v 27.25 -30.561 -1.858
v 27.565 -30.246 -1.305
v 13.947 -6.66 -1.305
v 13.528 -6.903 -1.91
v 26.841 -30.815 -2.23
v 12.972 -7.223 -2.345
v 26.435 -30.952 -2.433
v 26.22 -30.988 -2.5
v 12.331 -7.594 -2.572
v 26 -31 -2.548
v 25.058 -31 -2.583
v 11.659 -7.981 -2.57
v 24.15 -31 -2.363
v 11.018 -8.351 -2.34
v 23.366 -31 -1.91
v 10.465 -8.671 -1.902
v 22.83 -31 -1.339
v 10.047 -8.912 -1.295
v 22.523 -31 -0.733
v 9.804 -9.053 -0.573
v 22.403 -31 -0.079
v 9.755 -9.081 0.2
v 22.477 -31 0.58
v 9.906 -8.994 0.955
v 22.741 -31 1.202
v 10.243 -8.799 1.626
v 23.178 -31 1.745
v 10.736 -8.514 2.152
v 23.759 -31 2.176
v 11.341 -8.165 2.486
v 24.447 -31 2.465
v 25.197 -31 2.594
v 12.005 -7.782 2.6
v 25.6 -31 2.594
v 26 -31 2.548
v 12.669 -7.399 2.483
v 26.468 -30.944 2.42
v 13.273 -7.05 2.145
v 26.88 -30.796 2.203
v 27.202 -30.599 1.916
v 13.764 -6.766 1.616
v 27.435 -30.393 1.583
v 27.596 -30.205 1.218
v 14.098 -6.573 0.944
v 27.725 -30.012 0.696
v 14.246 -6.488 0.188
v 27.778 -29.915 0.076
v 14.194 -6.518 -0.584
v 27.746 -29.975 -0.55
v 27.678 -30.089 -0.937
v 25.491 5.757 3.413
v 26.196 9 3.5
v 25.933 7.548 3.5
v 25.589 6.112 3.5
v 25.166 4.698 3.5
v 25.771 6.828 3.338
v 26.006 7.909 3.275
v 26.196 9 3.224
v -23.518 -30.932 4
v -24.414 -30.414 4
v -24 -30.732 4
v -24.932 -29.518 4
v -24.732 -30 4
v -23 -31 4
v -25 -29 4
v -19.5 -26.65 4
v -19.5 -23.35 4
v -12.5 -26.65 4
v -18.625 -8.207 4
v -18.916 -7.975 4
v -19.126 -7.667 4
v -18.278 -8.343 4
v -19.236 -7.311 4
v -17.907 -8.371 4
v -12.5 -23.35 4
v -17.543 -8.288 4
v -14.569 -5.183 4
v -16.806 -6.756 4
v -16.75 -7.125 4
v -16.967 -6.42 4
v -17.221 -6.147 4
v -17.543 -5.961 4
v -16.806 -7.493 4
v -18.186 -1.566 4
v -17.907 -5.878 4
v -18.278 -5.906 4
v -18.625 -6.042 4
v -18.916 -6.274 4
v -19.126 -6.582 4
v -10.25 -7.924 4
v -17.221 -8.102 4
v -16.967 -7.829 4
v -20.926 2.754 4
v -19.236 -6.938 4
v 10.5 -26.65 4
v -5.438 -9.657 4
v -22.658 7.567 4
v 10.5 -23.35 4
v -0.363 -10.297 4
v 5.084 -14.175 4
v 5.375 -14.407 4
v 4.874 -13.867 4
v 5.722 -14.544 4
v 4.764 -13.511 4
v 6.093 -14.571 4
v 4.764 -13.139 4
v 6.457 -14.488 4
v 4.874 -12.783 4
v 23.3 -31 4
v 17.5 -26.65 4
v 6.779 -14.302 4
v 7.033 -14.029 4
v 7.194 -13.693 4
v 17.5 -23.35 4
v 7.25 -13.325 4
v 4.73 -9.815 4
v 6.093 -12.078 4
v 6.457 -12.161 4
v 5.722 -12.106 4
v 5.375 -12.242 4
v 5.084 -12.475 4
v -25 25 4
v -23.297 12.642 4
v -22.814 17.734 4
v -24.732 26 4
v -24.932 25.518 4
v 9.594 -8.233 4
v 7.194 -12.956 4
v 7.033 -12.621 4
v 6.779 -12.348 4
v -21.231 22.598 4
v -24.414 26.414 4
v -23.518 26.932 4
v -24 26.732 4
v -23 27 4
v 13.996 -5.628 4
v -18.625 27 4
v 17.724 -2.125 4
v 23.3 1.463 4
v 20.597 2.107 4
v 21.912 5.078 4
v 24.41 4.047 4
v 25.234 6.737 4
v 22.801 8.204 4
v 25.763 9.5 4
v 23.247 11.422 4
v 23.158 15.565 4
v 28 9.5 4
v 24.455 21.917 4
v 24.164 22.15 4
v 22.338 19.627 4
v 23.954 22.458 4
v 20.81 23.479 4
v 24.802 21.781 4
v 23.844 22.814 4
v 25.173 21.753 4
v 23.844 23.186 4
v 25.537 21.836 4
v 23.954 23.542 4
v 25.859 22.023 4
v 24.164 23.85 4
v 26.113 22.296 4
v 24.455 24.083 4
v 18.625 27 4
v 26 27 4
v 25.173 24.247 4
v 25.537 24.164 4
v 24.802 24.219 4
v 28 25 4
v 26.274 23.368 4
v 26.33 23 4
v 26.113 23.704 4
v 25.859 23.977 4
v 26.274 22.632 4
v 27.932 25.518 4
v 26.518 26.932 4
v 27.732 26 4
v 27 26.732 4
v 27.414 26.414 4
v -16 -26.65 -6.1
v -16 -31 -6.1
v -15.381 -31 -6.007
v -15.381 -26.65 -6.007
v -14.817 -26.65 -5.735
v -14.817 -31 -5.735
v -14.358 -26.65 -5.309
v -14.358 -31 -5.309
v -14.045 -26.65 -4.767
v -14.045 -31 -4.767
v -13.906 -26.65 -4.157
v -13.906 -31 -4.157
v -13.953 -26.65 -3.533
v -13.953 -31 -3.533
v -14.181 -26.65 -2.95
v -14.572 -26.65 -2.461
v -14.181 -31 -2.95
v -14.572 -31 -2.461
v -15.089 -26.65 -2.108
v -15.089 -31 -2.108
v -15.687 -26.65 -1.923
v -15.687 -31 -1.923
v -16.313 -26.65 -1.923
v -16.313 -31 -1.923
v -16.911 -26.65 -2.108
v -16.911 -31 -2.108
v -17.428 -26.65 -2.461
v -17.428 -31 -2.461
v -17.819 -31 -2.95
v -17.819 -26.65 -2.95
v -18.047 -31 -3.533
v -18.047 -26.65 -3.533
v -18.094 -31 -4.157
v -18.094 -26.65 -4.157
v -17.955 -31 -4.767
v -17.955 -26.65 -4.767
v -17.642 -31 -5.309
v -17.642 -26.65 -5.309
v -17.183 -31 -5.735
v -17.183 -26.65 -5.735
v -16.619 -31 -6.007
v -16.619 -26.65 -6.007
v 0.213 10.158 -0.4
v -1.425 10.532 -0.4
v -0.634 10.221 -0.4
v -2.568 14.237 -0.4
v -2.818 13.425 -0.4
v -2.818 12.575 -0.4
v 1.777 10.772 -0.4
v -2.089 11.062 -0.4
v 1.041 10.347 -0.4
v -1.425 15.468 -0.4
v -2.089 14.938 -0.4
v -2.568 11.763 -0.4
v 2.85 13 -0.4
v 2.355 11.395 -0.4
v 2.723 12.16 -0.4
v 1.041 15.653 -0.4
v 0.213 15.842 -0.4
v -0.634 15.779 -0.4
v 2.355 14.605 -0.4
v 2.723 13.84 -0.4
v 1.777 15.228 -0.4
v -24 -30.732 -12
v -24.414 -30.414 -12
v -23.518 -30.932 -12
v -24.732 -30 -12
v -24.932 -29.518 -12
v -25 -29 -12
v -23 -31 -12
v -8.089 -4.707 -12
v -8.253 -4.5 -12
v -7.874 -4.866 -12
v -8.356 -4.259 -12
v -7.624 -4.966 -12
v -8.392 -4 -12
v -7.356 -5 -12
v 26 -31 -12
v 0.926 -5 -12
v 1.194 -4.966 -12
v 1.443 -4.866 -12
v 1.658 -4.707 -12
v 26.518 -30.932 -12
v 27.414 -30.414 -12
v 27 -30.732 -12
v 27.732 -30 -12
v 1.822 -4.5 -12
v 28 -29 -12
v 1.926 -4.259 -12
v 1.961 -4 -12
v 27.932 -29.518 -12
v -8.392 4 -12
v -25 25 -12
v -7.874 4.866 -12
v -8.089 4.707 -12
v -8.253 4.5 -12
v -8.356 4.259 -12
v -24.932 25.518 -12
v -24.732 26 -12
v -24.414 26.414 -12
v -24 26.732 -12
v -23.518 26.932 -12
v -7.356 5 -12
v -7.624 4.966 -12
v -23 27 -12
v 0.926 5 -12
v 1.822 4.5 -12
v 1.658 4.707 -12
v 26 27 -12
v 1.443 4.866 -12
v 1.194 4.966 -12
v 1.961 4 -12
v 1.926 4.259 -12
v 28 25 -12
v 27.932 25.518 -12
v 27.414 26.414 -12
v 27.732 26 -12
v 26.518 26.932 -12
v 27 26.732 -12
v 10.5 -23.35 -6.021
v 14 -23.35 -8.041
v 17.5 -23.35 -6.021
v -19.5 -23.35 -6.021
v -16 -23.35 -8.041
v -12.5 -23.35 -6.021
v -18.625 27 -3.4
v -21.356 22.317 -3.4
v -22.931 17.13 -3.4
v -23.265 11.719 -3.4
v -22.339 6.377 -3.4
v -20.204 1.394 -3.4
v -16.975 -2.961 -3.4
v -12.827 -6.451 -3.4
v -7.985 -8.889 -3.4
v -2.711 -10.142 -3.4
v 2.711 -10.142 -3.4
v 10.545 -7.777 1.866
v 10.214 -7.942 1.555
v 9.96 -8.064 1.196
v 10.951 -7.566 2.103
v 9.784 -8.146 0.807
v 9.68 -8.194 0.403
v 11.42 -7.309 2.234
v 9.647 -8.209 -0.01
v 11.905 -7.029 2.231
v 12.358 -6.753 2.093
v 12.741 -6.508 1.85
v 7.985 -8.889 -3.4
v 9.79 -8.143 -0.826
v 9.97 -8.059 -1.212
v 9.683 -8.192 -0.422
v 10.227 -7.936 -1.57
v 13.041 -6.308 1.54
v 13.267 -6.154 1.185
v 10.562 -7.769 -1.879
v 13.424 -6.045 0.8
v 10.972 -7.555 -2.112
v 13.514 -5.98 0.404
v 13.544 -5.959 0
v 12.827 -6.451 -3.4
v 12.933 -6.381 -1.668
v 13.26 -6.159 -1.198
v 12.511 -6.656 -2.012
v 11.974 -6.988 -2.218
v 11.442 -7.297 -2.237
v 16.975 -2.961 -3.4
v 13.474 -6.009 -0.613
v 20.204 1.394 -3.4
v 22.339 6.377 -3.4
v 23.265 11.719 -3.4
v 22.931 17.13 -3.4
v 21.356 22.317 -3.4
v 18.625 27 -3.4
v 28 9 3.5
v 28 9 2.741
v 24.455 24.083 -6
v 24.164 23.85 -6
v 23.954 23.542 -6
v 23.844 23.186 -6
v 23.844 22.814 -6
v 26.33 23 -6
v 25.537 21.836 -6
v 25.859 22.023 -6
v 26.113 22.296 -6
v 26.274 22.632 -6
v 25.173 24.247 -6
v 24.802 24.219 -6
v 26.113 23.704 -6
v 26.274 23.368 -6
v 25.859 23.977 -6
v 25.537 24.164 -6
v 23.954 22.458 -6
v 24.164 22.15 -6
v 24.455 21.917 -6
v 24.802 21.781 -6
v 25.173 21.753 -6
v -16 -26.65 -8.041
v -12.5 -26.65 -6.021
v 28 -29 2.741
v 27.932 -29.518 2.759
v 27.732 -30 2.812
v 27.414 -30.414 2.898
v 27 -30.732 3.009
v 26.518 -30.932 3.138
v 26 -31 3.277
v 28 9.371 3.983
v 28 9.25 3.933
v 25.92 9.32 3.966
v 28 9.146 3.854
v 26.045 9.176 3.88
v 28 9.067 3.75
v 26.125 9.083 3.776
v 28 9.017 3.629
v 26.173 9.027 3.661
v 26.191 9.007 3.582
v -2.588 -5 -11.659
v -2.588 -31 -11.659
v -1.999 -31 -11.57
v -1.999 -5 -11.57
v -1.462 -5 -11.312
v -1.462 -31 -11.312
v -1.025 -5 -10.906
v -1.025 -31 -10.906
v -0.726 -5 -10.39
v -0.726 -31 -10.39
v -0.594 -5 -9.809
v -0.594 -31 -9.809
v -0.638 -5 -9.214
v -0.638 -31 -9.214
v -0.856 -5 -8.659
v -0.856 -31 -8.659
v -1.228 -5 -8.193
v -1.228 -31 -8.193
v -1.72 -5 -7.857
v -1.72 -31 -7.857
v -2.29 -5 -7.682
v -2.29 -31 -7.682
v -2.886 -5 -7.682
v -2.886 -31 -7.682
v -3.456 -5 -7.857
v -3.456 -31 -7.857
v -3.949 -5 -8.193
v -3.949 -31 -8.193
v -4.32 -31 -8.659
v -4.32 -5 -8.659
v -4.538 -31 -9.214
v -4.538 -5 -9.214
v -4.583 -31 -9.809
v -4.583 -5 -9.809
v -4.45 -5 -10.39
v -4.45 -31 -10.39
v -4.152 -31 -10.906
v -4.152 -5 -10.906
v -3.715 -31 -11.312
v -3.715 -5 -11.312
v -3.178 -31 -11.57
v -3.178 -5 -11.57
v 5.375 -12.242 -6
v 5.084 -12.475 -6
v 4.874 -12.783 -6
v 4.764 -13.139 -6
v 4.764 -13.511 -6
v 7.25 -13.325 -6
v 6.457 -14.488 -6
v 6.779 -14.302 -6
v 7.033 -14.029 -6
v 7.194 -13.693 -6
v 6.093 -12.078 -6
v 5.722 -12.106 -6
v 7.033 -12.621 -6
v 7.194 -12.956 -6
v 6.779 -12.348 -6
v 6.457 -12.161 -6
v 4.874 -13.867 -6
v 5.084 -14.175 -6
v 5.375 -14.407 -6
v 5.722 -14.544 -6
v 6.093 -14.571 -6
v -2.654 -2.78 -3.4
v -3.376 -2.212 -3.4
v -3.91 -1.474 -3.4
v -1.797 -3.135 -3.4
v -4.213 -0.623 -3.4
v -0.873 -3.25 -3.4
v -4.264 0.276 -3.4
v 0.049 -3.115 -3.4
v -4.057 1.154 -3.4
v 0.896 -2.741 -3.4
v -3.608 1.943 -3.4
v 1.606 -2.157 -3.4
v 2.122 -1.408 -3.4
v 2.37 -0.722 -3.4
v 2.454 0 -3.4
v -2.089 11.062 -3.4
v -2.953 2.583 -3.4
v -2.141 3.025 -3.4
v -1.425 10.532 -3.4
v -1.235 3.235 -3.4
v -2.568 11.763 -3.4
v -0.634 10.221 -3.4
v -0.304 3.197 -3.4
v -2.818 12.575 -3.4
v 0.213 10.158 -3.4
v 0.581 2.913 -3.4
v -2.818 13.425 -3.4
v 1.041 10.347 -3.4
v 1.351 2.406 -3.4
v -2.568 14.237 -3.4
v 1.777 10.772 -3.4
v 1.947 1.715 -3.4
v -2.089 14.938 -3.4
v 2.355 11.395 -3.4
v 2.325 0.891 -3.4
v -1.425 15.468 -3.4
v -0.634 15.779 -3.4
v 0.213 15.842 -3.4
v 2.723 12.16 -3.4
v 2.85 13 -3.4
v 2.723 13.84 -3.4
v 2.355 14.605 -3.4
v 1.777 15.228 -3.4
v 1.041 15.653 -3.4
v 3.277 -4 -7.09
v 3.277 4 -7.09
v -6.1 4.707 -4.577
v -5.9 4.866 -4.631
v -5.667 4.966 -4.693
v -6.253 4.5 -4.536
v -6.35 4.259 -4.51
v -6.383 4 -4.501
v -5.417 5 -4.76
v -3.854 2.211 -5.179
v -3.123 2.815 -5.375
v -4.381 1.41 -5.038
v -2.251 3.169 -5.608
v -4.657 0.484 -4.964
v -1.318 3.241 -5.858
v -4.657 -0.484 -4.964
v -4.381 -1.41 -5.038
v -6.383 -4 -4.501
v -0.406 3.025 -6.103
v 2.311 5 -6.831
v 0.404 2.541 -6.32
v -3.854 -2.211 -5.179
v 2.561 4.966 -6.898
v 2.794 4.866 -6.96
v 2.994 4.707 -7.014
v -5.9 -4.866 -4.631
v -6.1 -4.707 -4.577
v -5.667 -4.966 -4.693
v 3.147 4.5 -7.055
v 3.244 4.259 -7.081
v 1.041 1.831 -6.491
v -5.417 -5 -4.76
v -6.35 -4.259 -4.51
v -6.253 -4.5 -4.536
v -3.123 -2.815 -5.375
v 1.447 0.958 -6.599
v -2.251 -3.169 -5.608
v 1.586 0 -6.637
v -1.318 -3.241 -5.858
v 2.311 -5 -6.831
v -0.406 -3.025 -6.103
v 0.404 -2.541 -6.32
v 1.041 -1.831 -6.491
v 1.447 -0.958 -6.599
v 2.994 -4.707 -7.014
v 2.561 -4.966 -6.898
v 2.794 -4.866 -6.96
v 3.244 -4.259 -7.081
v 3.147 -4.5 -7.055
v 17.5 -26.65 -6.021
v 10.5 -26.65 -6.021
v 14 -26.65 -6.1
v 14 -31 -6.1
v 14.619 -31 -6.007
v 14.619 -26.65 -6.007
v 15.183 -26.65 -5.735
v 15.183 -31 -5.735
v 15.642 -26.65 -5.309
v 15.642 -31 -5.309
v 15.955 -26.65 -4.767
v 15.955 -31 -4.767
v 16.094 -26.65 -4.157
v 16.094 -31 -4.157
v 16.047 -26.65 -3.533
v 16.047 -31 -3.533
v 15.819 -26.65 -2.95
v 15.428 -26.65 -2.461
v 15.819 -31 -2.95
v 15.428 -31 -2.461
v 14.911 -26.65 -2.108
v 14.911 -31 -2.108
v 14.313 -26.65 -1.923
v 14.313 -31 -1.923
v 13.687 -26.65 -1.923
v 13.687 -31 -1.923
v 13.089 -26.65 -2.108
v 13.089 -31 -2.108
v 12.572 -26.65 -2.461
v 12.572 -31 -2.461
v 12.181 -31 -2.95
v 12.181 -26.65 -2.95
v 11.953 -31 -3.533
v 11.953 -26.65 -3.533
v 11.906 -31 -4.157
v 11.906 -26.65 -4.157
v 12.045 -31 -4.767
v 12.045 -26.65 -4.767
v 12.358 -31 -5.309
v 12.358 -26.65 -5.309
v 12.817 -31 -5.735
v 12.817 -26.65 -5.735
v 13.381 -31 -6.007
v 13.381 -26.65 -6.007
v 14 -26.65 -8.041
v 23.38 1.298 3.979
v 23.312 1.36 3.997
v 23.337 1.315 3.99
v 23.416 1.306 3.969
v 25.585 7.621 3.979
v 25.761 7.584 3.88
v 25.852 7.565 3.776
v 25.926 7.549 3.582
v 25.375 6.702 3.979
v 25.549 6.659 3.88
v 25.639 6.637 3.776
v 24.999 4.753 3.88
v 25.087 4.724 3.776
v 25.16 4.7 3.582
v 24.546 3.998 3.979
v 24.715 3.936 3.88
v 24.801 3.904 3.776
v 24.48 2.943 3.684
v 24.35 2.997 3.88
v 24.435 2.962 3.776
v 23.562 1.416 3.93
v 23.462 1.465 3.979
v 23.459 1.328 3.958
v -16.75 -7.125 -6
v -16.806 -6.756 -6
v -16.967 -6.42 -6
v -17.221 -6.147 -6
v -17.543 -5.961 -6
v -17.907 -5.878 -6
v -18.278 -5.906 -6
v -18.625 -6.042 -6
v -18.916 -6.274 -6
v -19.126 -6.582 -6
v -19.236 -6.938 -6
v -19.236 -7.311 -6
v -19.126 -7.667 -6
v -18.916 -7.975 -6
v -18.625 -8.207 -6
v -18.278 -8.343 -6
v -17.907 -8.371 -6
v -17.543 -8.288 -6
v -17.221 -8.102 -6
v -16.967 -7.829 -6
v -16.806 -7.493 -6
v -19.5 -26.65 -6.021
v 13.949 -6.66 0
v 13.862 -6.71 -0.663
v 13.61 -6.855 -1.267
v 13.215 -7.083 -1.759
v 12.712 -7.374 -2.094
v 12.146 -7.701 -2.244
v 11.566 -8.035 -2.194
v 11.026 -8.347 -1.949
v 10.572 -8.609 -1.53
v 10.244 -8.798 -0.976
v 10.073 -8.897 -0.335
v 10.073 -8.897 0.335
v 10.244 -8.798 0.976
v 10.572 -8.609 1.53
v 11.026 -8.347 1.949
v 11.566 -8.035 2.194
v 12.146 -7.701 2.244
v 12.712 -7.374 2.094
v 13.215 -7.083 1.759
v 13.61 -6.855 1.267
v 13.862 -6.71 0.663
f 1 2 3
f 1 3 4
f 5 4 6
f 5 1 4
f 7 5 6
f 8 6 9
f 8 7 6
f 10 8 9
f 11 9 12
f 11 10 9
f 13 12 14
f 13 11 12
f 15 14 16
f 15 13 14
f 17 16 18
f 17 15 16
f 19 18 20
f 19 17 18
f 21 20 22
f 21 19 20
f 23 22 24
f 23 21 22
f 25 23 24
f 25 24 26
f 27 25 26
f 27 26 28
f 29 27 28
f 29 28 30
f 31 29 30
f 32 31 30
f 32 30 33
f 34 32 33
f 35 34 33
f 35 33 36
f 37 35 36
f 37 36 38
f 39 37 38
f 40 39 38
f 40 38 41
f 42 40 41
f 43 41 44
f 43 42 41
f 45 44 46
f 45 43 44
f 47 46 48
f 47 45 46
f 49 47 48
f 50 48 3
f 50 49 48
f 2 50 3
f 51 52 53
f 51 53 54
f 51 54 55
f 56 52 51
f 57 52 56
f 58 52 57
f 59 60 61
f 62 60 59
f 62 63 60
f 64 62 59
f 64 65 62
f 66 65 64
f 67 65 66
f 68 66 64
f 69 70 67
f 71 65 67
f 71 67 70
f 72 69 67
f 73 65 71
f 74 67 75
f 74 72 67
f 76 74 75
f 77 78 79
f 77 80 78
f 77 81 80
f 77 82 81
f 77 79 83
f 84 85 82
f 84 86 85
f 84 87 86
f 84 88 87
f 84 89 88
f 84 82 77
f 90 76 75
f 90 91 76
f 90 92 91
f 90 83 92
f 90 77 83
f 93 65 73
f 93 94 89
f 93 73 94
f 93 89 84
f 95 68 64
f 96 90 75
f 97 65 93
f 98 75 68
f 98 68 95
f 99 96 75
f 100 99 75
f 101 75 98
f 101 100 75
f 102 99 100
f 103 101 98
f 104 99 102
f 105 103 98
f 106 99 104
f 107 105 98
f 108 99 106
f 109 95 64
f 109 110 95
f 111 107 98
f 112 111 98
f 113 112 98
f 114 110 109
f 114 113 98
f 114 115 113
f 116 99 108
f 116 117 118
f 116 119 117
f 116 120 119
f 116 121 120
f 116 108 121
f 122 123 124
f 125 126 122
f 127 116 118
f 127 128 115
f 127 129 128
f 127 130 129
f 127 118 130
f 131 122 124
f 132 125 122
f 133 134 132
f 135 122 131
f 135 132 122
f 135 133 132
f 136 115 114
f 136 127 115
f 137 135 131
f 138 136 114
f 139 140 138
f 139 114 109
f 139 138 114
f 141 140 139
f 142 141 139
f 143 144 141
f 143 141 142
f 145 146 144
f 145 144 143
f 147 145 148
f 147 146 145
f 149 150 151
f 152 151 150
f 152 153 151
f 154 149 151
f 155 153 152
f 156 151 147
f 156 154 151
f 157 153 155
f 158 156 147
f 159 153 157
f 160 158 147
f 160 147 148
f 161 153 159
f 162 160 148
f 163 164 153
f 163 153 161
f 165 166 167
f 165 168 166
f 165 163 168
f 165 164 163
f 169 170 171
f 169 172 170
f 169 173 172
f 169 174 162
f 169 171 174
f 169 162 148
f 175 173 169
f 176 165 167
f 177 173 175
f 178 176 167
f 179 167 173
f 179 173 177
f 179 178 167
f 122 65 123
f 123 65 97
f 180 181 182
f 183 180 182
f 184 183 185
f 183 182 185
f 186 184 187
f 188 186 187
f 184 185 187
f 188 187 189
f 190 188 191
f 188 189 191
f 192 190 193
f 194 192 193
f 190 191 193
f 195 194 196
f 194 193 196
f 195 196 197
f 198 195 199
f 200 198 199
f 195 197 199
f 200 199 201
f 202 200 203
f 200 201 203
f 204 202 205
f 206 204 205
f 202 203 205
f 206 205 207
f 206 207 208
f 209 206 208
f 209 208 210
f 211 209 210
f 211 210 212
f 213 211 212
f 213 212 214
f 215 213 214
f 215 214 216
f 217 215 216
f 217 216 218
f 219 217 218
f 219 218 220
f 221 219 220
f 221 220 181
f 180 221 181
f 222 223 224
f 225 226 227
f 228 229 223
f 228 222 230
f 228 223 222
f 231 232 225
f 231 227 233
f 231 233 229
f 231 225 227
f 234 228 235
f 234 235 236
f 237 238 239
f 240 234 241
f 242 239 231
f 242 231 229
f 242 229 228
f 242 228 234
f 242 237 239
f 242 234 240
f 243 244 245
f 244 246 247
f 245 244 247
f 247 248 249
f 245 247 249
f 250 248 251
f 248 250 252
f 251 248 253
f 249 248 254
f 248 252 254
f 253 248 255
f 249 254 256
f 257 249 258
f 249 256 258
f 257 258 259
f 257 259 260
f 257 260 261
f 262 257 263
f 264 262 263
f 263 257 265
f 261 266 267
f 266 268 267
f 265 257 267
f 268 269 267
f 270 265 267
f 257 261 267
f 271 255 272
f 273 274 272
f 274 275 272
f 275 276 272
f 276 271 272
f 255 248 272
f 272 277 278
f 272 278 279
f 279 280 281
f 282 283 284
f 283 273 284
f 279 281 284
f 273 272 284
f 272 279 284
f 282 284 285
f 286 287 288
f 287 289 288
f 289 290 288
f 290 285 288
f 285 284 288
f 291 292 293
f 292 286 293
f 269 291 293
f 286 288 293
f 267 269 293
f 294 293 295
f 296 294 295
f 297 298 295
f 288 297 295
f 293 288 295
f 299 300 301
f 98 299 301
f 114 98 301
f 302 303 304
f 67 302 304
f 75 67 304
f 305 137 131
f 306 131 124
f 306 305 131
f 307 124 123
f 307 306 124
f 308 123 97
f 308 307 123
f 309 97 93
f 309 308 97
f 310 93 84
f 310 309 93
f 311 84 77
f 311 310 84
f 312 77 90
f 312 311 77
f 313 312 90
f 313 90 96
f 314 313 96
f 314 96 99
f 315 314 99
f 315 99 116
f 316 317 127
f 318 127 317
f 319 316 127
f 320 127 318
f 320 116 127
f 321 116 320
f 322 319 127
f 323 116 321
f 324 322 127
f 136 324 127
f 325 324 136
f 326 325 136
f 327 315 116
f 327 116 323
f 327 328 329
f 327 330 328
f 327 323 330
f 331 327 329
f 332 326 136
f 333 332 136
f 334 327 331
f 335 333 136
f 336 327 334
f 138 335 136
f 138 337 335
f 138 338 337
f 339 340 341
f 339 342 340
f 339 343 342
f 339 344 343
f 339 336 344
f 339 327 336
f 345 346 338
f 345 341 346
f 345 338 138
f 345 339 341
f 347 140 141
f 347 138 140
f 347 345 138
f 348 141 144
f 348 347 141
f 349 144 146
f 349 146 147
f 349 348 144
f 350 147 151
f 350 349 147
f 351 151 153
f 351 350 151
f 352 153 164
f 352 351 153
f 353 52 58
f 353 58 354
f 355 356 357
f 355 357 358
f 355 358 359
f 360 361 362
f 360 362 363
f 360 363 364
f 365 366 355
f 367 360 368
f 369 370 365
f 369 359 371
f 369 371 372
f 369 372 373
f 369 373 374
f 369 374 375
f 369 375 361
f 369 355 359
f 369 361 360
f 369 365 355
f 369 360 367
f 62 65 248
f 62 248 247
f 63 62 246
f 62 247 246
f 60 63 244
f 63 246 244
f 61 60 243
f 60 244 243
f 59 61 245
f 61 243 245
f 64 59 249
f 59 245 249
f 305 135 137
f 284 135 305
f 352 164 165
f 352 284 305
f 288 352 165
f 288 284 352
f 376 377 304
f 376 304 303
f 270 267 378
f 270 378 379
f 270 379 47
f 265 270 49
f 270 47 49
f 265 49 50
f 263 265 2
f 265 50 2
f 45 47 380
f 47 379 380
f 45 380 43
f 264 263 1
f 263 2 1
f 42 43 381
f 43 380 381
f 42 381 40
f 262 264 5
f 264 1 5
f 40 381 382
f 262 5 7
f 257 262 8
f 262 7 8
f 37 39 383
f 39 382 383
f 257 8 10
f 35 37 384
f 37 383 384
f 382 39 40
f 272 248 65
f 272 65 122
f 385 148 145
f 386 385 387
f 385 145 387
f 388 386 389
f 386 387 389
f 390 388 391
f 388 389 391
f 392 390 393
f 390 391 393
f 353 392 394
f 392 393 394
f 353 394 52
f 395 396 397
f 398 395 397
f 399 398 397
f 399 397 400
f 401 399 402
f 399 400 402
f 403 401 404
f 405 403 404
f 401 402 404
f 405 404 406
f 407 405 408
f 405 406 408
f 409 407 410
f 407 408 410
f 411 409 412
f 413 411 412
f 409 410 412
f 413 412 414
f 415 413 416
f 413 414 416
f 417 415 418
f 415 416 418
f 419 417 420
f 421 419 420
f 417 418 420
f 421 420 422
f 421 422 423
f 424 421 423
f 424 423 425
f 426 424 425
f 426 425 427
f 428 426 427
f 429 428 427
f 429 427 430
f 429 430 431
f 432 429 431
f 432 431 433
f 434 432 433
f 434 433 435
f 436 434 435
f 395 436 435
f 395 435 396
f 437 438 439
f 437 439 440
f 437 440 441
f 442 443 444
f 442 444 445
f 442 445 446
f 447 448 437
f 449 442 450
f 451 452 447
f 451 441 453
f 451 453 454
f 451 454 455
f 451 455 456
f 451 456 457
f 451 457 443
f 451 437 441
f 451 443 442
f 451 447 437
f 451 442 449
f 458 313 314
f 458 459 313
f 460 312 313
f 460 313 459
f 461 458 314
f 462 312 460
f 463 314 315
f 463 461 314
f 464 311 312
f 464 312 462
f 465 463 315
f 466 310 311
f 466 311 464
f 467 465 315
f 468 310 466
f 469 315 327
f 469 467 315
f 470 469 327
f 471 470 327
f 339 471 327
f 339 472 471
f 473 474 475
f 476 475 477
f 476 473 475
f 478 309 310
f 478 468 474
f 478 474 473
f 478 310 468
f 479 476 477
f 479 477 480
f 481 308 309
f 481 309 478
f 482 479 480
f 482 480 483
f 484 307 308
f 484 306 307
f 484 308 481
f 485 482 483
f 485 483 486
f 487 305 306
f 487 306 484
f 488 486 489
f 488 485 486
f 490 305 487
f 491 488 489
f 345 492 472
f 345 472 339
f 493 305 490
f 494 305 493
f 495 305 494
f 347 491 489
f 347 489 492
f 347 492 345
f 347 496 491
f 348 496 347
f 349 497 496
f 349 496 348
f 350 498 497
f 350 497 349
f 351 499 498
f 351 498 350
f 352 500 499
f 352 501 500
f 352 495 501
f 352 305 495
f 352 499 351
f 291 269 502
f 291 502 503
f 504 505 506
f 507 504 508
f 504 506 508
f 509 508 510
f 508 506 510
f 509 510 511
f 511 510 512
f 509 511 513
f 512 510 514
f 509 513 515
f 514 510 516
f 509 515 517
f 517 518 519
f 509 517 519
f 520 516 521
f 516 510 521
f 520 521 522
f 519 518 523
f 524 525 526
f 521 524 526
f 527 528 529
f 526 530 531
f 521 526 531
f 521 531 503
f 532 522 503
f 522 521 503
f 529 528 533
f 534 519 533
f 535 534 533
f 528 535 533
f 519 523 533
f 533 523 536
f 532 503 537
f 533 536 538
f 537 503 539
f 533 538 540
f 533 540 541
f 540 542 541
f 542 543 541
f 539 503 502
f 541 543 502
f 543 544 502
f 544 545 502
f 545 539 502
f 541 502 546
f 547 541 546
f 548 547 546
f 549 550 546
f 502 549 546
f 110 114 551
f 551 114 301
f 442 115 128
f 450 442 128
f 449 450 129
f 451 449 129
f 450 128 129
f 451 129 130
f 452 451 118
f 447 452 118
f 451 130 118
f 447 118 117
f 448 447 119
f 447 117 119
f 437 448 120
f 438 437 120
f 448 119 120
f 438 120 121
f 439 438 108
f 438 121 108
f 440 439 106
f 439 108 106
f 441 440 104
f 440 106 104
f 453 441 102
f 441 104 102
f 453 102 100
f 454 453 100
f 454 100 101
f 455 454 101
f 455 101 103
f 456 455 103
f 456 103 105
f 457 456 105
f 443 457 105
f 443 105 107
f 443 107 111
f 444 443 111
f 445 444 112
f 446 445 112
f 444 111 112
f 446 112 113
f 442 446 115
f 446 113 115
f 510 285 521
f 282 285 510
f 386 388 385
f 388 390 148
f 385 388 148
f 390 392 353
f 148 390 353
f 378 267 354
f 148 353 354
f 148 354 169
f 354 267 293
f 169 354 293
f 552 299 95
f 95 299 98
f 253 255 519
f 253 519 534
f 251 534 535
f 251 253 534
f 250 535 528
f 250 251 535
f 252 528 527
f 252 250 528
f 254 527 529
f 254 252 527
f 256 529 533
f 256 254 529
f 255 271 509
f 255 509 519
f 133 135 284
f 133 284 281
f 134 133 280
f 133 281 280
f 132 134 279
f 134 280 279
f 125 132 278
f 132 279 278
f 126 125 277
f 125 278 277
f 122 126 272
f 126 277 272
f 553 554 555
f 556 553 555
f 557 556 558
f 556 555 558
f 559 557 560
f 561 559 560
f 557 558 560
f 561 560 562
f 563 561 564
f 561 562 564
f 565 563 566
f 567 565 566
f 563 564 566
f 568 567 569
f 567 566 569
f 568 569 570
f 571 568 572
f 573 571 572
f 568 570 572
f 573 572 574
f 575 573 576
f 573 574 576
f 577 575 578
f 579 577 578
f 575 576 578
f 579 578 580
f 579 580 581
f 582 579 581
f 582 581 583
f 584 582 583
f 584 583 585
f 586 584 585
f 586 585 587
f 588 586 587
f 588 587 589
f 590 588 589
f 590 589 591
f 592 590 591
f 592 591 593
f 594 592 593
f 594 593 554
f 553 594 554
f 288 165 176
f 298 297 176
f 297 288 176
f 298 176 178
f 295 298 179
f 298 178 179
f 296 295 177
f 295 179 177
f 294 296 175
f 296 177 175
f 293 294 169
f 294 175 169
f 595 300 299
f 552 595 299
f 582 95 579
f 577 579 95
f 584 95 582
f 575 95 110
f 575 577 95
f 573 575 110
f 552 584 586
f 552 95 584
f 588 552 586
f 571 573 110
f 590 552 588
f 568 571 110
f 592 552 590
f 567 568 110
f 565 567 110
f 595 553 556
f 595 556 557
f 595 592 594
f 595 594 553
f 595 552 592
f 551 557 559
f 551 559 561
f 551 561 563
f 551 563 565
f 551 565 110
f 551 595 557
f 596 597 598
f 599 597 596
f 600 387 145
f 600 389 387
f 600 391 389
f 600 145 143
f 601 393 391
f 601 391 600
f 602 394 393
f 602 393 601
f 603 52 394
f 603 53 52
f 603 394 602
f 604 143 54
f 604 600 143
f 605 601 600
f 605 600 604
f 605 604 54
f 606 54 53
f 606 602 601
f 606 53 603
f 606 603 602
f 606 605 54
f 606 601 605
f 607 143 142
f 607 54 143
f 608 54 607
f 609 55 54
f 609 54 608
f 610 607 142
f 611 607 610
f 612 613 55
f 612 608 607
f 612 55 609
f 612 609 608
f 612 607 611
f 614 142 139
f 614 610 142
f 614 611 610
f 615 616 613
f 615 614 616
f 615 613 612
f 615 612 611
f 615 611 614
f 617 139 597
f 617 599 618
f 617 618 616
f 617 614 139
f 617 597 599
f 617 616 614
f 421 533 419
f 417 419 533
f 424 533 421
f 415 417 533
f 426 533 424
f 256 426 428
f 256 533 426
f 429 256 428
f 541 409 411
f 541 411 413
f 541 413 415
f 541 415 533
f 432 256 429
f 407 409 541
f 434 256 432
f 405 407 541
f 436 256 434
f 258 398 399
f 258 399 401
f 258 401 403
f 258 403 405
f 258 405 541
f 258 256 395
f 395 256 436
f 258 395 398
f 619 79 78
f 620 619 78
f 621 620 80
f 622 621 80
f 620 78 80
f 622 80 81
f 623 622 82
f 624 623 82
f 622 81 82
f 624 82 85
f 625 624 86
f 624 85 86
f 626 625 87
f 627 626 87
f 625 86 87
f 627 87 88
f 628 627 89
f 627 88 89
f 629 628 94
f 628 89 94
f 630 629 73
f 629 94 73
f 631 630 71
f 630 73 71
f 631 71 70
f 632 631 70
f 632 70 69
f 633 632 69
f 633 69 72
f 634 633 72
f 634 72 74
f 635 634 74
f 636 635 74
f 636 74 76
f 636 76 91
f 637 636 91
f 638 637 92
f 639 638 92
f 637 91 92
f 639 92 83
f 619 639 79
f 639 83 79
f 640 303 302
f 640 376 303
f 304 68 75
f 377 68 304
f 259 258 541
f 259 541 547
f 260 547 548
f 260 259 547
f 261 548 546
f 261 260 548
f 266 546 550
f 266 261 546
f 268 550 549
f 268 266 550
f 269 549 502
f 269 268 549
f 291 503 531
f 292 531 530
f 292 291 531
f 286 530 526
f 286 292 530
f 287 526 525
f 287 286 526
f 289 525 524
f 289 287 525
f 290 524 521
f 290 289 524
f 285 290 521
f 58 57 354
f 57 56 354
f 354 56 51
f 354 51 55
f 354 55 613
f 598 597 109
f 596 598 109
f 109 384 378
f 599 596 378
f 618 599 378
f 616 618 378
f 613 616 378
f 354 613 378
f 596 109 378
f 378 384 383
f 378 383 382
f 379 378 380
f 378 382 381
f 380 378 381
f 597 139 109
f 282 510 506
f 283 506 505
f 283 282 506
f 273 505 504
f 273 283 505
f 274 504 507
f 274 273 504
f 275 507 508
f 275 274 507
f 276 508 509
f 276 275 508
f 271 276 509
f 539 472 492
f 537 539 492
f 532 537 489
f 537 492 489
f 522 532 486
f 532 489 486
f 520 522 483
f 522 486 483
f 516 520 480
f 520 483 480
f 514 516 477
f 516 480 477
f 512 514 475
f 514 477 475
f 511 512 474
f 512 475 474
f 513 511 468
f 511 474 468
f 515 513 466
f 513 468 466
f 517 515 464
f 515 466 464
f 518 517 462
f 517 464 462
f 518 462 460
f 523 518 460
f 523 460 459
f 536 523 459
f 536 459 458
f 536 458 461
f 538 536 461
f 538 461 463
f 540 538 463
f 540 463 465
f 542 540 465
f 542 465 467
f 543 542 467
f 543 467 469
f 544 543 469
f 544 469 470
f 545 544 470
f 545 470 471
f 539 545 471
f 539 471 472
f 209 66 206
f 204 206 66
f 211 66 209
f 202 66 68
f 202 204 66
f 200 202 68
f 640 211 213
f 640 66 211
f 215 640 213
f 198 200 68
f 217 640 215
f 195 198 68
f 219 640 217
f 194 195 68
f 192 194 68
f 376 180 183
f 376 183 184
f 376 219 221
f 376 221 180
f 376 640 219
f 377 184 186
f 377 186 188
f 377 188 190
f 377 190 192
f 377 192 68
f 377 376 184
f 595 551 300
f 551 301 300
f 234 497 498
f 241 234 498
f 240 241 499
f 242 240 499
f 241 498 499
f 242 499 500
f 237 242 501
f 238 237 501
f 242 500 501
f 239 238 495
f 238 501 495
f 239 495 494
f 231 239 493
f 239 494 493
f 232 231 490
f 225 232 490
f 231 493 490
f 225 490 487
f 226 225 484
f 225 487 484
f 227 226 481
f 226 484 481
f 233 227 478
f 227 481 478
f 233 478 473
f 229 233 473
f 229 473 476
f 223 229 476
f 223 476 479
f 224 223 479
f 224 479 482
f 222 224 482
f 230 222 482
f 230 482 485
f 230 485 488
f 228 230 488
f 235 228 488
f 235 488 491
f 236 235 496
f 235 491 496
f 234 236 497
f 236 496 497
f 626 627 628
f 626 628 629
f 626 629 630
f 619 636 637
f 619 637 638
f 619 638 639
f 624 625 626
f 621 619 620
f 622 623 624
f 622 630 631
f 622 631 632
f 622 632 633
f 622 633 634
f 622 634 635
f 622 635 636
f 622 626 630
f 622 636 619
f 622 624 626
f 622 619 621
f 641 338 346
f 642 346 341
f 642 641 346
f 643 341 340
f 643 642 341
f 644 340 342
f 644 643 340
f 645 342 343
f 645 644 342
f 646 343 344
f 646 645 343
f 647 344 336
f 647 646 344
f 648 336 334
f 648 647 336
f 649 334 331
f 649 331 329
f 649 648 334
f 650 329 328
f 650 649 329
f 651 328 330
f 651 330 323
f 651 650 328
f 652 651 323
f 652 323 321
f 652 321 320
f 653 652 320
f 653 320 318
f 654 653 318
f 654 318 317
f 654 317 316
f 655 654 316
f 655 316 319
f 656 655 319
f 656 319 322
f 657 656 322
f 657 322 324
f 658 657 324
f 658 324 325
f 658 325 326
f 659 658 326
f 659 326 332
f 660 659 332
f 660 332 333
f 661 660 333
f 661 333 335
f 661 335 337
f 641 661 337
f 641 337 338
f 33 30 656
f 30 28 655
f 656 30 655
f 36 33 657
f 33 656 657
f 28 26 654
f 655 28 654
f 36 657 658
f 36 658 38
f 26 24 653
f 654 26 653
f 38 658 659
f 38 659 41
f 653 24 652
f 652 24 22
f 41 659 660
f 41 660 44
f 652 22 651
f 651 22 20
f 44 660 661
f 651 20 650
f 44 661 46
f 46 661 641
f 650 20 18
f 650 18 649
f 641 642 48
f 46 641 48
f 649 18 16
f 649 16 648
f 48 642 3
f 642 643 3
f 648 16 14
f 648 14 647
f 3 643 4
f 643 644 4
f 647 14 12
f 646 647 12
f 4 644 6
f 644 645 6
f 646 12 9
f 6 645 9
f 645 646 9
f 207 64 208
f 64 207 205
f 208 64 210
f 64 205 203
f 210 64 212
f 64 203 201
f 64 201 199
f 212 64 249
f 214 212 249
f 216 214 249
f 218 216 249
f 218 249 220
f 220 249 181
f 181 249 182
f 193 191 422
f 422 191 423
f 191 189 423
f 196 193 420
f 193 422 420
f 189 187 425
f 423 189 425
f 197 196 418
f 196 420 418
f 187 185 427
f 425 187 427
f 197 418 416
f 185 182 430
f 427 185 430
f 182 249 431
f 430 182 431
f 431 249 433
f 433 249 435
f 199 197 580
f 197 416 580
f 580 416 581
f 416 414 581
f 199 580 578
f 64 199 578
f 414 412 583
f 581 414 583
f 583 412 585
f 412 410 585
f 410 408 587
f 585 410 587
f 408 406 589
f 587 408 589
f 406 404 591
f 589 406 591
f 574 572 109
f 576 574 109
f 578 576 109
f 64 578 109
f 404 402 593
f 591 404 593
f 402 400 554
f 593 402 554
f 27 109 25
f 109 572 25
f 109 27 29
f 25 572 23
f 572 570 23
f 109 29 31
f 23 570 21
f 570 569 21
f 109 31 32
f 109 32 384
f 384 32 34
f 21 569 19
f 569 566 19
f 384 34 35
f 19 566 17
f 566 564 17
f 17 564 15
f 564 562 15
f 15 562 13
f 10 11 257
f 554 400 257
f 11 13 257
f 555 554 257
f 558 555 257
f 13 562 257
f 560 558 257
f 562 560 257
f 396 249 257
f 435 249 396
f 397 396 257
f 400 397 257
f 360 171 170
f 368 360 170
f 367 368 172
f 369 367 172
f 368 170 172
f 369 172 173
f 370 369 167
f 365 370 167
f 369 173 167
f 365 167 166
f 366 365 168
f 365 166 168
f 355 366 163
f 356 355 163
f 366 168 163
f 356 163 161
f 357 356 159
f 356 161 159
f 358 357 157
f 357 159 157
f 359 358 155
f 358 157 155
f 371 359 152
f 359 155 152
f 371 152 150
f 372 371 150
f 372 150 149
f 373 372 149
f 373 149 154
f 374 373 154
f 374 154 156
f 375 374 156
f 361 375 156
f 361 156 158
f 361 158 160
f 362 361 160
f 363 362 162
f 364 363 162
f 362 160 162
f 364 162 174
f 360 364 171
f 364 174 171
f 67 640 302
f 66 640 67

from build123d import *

# Parameters (mm, degrees)
BOSS_EXTRUDE1_DEPTH      = 4
BOSS_EXTRUDE1_DEPTH_BACK = 12
SKETCH1_W                = 53
SKETCH1_H                = 58
CUT_EXTRUDE1_DEPTH       = 4
CUT_EXTRUDE1_DEPTH_BACK  = 3.4
SKETCH2_R                = 23.3
SKETCH3_R                = 2.85
BOSS_EXTRUDE2_DEPTH      = 3
SKETCH4_R                = 2.25
CUT_EXTRUDE2_DEPTH       = 32
SKETCH5_R                = 2.6
CUT_EXTRUDE3_DEPTH       = 30
SKETCH6_R                = 3.25
CUT_EXTRUDE4_DEPTH       = 44.462627624
CUT_EXTRUDE5_DEPTH       = 8
SKETCH11_R               = 1.5
CUT_EXTRUDE6_DEPTH       = 27
SKETCH12_R               = 2
CUT_EXTRUDE7_DEPTH       = 27
SKETCH13_R               = 1.25
CUT_EXTRUDE8_DEPTH       = 10
FILLET1_R                = 2
CUT_EXTRUDE9_DEPTH       = 40
BOSS_EXTRUDE3_START      = -3
BOSS_EXTRUDE3_DEPTH      = 3
FILLET3_R                = 0.5
CUT_EXTRUDE11_DEPTH      = 1.65
CUT_EXTRUDE12_REACH      = 67.513
SKETCH18_R               = 2.1


with BuildPart() as part:
    # Sketch1 → Boss-Extrude1 (new, two sides: drawn at the far end of the back side and taken through both)
    with BuildSketch(Plane.XY.offset(-BOSS_EXTRUDE1_DEPTH_BACK)):
        with Locations((1.5, -2)):
            Rectangle(SKETCH1_W, SKETCH1_H)
    extrude(amount=BOSS_EXTRUDE1_DEPTH + BOSS_EXTRUDE1_DEPTH_BACK)

    # Sketch2 → Cut-Extrude1 (cut, two sides: drawn at the far end of the back side and taken through both)
    with BuildSketch(Plane.XY.offset(-CUT_EXTRUDE1_DEPTH_BACK)):
        with Locations((0, 13)):
            Circle(SKETCH2_R)
    extrude(amount=CUT_EXTRUDE1_DEPTH + CUT_EXTRUDE1_DEPTH_BACK, mode=Mode.SUBTRACT)

    # Sketch3 → Boss-Extrude2 (add)
    with BuildSketch(Plane.XY.offset(-3.4)):
        with Locations((0, 13)):
            Circle(SKETCH3_R)
    extrude(amount=BOSS_EXTRUDE2_DEPTH)

    # Sketch4 → Cut-Extrude2 (cut)
    with BuildSketch(Plane(origin=(21.370834875, -37.015371804, 0), x_dir=(0, 0, 1), z_dir=(-0.500000000000001, 0.866025403784438, 0))):
        with Locations(Location((0, 6.5, 0), (0, 0, 90))):
            Circle(SKETCH4_R)
    extrude(amount=CUT_EXTRUDE2_DEPTH, mode=Mode.SUBTRACT)

    # Sketch5 → Cut-Extrude3 (cut)
    with BuildSketch(Plane(origin=(21.370834875, -37.015371804, 0), x_dir=(0, 0, 1), z_dir=(-0.500000000000001, 0.866025403784438, 0))):
        with Locations(Location((0, 6.5, 0), (0, 0, 120.129971207))):
            Circle(SKETCH5_R)
    extrude(amount=CUT_EXTRUDE3_DEPTH, mode=Mode.SUBTRACT)

    # Sketch6 → Cut-Extrude4 (cut, through all)
    with BuildSketch(Plane(origin=(0, 0, 0), x_dir=(0, -1, 0), z_dir=(0.25881904510252135, 0, 0.9659258262890681))):
        with Locations(Location((0, 0, 0), (0, 0, 90))):
            Circle(SKETCH6_R)
    extrude(amount=-CUT_EXTRUDE4_DEPTH, mode=Mode.SUBTRACT)

    # Sketch10 → Cut-Extrude5 (cut)
    with BuildSketch(Plane(origin=(-3.623466631, 0, -13.522961568), x_dir=(0, -1, 0), z_dir=(0.25881904510252135, 0, 0.9659258262890681))):
        with BuildLine():
            Line((4, 5), (-4, 5))
            ThreePointArc((-4, 5), (-4.707106781, 4.707106781), (-5, 4))
            Line((-5, 4), (-5, -4))
            ThreePointArc((-5, -4), (-4.707106781, -4.707106781), (-4, -5))
            Line((-4, -5), (4, -5))
            ThreePointArc((4, -5), (4.707106781, -4.707106781), (5, -4))
            Line((5, -4), (5, 4))
            ThreePointArc((5, 4), (4.707106781, 4.707106781), (4, 5))
        make_face()
    extrude(amount=CUT_EXTRUDE5_DEPTH, mode=Mode.SUBTRACT)

    # Sketch11 → Cut-Extrude6 (cut)
    with BuildSketch(Plane.XZ.offset(31)):
        with Locations(Location((-2.588190451, -9.659258263, 0), (0, 0, 270))):
            Circle(SKETCH11_R)
    extrude(amount=-CUT_EXTRUDE6_DEPTH, mode=Mode.SUBTRACT)

    # Sketch12 → Cut-Extrude7 (cut)
    with BuildSketch(Plane.XZ.offset(31)):
        with Locations(Location((-2.588190451, -9.659258263, 0), (0, 0, 270))):
            Circle(SKETCH12_R)
    extrude(amount=-CUT_EXTRUDE7_DEPTH, mode=Mode.SUBTRACT)

    # Sketch13 → Cut-Extrude8 (cut)
    with BuildSketch(Plane.XY.offset(4)):
        with Locations((25.079872408, 23)):
            Circle(SKETCH13_R)
        with Locations((-18, -7.124611797)):
            Circle(SKETCH13_R)
        with Locations((6, -13.324893162)):
            Circle(SKETCH13_R)
    extrude(amount=-CUT_EXTRUDE8_DEPTH, mode=Mode.SUBTRACT)

    # Fillet1
    # the kernel refuses this fillet: 2 mm, written as the material it takes off along each edge
    with BuildSketch(Plane(origin=(28, -31, 9), x_dir=(0, 1, 0), z_dir=(0, 0, -1))) as fillet1_piece_1:
        with BuildLine():
            CenterArc((FILLET1_R, -FILLET1_R), FILLET1_R, 90, 90)
            Line((0, -FILLET1_R), (0, 0))
            Line((0, 0), (FILLET1_R, 0))
        make_face()
    extrude(amount=12.694895612, mode=Mode.SUBTRACT)
    with BuildSketch(Plane(origin=(-25, 27, -17), x_dir=(1, 0, 0), z_dir=(0, 0, 1)), Plane(origin=(28, 27, 9), x_dir=(-1, 0, 0), z_dir=(0, 0, -1)), Plane(origin=(-25, -31, -17), x_dir=(0, 1, 0), z_dir=(0, 0, 1))) as fillet1_piece_2:
        with BuildLine():
            CenterArc((FILLET1_R, -FILLET1_R), FILLET1_R, 90, 90)
            Line((0, -FILLET1_R), (0, 0))
            Line((0, 0), (FILLET1_R, 0))
        make_face()
    extrude(amount=26, mode=Mode.SUBTRACT)
    with BuildSketch(Plane(origin=(28, -31, 3.694895612), x_dir=(0, 1, 0), z_dir=(0, 0, -1))) as fillet1_piece_3:
        with BuildLine():
            CenterArc((FILLET1_R, -FILLET1_R), FILLET1_R, 90, 90)
            Line((0, -FILLET1_R), (0, 0))
            Line((0, 0), (FILLET1_R, 0))
        make_face()
    extrude(amount=20.694895612, mode=Mode.SUBTRACT)

    # Sketch14 → Cut-Extrude9 (cut)
    with BuildSketch(Plane.XZ.offset(31)):
        Polygon((23.3, 4), (28, 2.740638796), (28, 4), align=None)
    extrude(amount=-CUT_EXTRUDE9_DEPTH, mode=Mode.SUBTRACT)

    # Sketch15 → Boss-Extrude3 (add)
    with BuildSketch(Plane.XY.offset(4).offset(BOSS_EXTRUDE3_START)):
        with BuildLine():
            Line((23.246505231, 11.422028337), (26.452977251, 11.422028337))
            ThreePointArc((26.452977251, 11.422028337), (25.46678498, 5.672458614), (23.246505231, 0.277972073))
            Line((23.246505231, 0.277972073), (20.59705621, 2.107283375))
            ThreePointArc((20.59705621, 2.107283375), (22.41105951, 6.625487343), (23.246505231, 11.422028337))
        make_face()
    extrude(amount=BOSS_EXTRUDE3_DEPTH)

    # Fillet3
    fillet3_edges = [part.edges().sort_by_distance(p)[0] for p in [
        (27.098186897, 9, 4),
        (25.121010739, 4.562890339, 4),
    ]]
    fillet(fillet3_edges, radius=FILLET3_R)

    # Sketch17 → Cut-Extrude11 (cut, symmetric)
    with BuildSketch(Plane(origin=(0, -25, 0), x_dir=(1, 0, 0), z_dir=(0, 1, 0))):
        Polygon((-12.5, 6.020725942), (-16, 8.041451884), (-19.5, 6.020725942), (-19.5, 1.979274058), (-19.5, -4), (-12.5, -4), (-12.5, 1.979274058), align=None)
        Polygon((17.5, 6.020725942), (14, 8.041451884), (10.5, 6.020725942), (10.5, 1.979274058), (10.5, -4), (17.5, -4), (17.5, 1.979274058), align=None)
    extrude(amount=CUT_EXTRUDE11_DEPTH, both=True, mode=Mode.SUBTRACT)

    # Sketch18 → Cut-Extrude12 (cut, up to next)
    with BuildSketch(Plane.XZ.offset(31), mode=Mode.PRIVATE) as cut_extrude12_sk1:
        with Locations(Location((-16, -4, 0), (0, 0, 270))):
            Circle(SKETCH18_R)
    cut_extrude12_tool1 = extrude(cut_extrude12_sk1.sketch, amount=-CUT_EXTRUDE12_REACH, mode=Mode.PRIVATE) & part.part
    # Sketch18 → Cut-Extrude12 (cut, up to next)
    with BuildSketch(Plane.XZ.offset(31), mode=Mode.PRIVATE) as cut_extrude12_sk2:
        with Locations(Location((14, -4, 0), (0, 0, 270))):
            Circle(SKETCH18_R)
    cut_extrude12_tool2 = extrude(cut_extrude12_sk2.sketch, amount=-CUT_EXTRUDE12_REACH, mode=Mode.PRIVATE) & part.part
    add(cut_extrude12_tool1.solids().sort_by_distance((-16, -31, -4))[0], mode=Mode.SUBTRACT)
    add(cut_extrude12_tool2.solids().sort_by_distance((14, -31, -4))[0], mode=Mode.SUBTRACT)


solid = part.part
